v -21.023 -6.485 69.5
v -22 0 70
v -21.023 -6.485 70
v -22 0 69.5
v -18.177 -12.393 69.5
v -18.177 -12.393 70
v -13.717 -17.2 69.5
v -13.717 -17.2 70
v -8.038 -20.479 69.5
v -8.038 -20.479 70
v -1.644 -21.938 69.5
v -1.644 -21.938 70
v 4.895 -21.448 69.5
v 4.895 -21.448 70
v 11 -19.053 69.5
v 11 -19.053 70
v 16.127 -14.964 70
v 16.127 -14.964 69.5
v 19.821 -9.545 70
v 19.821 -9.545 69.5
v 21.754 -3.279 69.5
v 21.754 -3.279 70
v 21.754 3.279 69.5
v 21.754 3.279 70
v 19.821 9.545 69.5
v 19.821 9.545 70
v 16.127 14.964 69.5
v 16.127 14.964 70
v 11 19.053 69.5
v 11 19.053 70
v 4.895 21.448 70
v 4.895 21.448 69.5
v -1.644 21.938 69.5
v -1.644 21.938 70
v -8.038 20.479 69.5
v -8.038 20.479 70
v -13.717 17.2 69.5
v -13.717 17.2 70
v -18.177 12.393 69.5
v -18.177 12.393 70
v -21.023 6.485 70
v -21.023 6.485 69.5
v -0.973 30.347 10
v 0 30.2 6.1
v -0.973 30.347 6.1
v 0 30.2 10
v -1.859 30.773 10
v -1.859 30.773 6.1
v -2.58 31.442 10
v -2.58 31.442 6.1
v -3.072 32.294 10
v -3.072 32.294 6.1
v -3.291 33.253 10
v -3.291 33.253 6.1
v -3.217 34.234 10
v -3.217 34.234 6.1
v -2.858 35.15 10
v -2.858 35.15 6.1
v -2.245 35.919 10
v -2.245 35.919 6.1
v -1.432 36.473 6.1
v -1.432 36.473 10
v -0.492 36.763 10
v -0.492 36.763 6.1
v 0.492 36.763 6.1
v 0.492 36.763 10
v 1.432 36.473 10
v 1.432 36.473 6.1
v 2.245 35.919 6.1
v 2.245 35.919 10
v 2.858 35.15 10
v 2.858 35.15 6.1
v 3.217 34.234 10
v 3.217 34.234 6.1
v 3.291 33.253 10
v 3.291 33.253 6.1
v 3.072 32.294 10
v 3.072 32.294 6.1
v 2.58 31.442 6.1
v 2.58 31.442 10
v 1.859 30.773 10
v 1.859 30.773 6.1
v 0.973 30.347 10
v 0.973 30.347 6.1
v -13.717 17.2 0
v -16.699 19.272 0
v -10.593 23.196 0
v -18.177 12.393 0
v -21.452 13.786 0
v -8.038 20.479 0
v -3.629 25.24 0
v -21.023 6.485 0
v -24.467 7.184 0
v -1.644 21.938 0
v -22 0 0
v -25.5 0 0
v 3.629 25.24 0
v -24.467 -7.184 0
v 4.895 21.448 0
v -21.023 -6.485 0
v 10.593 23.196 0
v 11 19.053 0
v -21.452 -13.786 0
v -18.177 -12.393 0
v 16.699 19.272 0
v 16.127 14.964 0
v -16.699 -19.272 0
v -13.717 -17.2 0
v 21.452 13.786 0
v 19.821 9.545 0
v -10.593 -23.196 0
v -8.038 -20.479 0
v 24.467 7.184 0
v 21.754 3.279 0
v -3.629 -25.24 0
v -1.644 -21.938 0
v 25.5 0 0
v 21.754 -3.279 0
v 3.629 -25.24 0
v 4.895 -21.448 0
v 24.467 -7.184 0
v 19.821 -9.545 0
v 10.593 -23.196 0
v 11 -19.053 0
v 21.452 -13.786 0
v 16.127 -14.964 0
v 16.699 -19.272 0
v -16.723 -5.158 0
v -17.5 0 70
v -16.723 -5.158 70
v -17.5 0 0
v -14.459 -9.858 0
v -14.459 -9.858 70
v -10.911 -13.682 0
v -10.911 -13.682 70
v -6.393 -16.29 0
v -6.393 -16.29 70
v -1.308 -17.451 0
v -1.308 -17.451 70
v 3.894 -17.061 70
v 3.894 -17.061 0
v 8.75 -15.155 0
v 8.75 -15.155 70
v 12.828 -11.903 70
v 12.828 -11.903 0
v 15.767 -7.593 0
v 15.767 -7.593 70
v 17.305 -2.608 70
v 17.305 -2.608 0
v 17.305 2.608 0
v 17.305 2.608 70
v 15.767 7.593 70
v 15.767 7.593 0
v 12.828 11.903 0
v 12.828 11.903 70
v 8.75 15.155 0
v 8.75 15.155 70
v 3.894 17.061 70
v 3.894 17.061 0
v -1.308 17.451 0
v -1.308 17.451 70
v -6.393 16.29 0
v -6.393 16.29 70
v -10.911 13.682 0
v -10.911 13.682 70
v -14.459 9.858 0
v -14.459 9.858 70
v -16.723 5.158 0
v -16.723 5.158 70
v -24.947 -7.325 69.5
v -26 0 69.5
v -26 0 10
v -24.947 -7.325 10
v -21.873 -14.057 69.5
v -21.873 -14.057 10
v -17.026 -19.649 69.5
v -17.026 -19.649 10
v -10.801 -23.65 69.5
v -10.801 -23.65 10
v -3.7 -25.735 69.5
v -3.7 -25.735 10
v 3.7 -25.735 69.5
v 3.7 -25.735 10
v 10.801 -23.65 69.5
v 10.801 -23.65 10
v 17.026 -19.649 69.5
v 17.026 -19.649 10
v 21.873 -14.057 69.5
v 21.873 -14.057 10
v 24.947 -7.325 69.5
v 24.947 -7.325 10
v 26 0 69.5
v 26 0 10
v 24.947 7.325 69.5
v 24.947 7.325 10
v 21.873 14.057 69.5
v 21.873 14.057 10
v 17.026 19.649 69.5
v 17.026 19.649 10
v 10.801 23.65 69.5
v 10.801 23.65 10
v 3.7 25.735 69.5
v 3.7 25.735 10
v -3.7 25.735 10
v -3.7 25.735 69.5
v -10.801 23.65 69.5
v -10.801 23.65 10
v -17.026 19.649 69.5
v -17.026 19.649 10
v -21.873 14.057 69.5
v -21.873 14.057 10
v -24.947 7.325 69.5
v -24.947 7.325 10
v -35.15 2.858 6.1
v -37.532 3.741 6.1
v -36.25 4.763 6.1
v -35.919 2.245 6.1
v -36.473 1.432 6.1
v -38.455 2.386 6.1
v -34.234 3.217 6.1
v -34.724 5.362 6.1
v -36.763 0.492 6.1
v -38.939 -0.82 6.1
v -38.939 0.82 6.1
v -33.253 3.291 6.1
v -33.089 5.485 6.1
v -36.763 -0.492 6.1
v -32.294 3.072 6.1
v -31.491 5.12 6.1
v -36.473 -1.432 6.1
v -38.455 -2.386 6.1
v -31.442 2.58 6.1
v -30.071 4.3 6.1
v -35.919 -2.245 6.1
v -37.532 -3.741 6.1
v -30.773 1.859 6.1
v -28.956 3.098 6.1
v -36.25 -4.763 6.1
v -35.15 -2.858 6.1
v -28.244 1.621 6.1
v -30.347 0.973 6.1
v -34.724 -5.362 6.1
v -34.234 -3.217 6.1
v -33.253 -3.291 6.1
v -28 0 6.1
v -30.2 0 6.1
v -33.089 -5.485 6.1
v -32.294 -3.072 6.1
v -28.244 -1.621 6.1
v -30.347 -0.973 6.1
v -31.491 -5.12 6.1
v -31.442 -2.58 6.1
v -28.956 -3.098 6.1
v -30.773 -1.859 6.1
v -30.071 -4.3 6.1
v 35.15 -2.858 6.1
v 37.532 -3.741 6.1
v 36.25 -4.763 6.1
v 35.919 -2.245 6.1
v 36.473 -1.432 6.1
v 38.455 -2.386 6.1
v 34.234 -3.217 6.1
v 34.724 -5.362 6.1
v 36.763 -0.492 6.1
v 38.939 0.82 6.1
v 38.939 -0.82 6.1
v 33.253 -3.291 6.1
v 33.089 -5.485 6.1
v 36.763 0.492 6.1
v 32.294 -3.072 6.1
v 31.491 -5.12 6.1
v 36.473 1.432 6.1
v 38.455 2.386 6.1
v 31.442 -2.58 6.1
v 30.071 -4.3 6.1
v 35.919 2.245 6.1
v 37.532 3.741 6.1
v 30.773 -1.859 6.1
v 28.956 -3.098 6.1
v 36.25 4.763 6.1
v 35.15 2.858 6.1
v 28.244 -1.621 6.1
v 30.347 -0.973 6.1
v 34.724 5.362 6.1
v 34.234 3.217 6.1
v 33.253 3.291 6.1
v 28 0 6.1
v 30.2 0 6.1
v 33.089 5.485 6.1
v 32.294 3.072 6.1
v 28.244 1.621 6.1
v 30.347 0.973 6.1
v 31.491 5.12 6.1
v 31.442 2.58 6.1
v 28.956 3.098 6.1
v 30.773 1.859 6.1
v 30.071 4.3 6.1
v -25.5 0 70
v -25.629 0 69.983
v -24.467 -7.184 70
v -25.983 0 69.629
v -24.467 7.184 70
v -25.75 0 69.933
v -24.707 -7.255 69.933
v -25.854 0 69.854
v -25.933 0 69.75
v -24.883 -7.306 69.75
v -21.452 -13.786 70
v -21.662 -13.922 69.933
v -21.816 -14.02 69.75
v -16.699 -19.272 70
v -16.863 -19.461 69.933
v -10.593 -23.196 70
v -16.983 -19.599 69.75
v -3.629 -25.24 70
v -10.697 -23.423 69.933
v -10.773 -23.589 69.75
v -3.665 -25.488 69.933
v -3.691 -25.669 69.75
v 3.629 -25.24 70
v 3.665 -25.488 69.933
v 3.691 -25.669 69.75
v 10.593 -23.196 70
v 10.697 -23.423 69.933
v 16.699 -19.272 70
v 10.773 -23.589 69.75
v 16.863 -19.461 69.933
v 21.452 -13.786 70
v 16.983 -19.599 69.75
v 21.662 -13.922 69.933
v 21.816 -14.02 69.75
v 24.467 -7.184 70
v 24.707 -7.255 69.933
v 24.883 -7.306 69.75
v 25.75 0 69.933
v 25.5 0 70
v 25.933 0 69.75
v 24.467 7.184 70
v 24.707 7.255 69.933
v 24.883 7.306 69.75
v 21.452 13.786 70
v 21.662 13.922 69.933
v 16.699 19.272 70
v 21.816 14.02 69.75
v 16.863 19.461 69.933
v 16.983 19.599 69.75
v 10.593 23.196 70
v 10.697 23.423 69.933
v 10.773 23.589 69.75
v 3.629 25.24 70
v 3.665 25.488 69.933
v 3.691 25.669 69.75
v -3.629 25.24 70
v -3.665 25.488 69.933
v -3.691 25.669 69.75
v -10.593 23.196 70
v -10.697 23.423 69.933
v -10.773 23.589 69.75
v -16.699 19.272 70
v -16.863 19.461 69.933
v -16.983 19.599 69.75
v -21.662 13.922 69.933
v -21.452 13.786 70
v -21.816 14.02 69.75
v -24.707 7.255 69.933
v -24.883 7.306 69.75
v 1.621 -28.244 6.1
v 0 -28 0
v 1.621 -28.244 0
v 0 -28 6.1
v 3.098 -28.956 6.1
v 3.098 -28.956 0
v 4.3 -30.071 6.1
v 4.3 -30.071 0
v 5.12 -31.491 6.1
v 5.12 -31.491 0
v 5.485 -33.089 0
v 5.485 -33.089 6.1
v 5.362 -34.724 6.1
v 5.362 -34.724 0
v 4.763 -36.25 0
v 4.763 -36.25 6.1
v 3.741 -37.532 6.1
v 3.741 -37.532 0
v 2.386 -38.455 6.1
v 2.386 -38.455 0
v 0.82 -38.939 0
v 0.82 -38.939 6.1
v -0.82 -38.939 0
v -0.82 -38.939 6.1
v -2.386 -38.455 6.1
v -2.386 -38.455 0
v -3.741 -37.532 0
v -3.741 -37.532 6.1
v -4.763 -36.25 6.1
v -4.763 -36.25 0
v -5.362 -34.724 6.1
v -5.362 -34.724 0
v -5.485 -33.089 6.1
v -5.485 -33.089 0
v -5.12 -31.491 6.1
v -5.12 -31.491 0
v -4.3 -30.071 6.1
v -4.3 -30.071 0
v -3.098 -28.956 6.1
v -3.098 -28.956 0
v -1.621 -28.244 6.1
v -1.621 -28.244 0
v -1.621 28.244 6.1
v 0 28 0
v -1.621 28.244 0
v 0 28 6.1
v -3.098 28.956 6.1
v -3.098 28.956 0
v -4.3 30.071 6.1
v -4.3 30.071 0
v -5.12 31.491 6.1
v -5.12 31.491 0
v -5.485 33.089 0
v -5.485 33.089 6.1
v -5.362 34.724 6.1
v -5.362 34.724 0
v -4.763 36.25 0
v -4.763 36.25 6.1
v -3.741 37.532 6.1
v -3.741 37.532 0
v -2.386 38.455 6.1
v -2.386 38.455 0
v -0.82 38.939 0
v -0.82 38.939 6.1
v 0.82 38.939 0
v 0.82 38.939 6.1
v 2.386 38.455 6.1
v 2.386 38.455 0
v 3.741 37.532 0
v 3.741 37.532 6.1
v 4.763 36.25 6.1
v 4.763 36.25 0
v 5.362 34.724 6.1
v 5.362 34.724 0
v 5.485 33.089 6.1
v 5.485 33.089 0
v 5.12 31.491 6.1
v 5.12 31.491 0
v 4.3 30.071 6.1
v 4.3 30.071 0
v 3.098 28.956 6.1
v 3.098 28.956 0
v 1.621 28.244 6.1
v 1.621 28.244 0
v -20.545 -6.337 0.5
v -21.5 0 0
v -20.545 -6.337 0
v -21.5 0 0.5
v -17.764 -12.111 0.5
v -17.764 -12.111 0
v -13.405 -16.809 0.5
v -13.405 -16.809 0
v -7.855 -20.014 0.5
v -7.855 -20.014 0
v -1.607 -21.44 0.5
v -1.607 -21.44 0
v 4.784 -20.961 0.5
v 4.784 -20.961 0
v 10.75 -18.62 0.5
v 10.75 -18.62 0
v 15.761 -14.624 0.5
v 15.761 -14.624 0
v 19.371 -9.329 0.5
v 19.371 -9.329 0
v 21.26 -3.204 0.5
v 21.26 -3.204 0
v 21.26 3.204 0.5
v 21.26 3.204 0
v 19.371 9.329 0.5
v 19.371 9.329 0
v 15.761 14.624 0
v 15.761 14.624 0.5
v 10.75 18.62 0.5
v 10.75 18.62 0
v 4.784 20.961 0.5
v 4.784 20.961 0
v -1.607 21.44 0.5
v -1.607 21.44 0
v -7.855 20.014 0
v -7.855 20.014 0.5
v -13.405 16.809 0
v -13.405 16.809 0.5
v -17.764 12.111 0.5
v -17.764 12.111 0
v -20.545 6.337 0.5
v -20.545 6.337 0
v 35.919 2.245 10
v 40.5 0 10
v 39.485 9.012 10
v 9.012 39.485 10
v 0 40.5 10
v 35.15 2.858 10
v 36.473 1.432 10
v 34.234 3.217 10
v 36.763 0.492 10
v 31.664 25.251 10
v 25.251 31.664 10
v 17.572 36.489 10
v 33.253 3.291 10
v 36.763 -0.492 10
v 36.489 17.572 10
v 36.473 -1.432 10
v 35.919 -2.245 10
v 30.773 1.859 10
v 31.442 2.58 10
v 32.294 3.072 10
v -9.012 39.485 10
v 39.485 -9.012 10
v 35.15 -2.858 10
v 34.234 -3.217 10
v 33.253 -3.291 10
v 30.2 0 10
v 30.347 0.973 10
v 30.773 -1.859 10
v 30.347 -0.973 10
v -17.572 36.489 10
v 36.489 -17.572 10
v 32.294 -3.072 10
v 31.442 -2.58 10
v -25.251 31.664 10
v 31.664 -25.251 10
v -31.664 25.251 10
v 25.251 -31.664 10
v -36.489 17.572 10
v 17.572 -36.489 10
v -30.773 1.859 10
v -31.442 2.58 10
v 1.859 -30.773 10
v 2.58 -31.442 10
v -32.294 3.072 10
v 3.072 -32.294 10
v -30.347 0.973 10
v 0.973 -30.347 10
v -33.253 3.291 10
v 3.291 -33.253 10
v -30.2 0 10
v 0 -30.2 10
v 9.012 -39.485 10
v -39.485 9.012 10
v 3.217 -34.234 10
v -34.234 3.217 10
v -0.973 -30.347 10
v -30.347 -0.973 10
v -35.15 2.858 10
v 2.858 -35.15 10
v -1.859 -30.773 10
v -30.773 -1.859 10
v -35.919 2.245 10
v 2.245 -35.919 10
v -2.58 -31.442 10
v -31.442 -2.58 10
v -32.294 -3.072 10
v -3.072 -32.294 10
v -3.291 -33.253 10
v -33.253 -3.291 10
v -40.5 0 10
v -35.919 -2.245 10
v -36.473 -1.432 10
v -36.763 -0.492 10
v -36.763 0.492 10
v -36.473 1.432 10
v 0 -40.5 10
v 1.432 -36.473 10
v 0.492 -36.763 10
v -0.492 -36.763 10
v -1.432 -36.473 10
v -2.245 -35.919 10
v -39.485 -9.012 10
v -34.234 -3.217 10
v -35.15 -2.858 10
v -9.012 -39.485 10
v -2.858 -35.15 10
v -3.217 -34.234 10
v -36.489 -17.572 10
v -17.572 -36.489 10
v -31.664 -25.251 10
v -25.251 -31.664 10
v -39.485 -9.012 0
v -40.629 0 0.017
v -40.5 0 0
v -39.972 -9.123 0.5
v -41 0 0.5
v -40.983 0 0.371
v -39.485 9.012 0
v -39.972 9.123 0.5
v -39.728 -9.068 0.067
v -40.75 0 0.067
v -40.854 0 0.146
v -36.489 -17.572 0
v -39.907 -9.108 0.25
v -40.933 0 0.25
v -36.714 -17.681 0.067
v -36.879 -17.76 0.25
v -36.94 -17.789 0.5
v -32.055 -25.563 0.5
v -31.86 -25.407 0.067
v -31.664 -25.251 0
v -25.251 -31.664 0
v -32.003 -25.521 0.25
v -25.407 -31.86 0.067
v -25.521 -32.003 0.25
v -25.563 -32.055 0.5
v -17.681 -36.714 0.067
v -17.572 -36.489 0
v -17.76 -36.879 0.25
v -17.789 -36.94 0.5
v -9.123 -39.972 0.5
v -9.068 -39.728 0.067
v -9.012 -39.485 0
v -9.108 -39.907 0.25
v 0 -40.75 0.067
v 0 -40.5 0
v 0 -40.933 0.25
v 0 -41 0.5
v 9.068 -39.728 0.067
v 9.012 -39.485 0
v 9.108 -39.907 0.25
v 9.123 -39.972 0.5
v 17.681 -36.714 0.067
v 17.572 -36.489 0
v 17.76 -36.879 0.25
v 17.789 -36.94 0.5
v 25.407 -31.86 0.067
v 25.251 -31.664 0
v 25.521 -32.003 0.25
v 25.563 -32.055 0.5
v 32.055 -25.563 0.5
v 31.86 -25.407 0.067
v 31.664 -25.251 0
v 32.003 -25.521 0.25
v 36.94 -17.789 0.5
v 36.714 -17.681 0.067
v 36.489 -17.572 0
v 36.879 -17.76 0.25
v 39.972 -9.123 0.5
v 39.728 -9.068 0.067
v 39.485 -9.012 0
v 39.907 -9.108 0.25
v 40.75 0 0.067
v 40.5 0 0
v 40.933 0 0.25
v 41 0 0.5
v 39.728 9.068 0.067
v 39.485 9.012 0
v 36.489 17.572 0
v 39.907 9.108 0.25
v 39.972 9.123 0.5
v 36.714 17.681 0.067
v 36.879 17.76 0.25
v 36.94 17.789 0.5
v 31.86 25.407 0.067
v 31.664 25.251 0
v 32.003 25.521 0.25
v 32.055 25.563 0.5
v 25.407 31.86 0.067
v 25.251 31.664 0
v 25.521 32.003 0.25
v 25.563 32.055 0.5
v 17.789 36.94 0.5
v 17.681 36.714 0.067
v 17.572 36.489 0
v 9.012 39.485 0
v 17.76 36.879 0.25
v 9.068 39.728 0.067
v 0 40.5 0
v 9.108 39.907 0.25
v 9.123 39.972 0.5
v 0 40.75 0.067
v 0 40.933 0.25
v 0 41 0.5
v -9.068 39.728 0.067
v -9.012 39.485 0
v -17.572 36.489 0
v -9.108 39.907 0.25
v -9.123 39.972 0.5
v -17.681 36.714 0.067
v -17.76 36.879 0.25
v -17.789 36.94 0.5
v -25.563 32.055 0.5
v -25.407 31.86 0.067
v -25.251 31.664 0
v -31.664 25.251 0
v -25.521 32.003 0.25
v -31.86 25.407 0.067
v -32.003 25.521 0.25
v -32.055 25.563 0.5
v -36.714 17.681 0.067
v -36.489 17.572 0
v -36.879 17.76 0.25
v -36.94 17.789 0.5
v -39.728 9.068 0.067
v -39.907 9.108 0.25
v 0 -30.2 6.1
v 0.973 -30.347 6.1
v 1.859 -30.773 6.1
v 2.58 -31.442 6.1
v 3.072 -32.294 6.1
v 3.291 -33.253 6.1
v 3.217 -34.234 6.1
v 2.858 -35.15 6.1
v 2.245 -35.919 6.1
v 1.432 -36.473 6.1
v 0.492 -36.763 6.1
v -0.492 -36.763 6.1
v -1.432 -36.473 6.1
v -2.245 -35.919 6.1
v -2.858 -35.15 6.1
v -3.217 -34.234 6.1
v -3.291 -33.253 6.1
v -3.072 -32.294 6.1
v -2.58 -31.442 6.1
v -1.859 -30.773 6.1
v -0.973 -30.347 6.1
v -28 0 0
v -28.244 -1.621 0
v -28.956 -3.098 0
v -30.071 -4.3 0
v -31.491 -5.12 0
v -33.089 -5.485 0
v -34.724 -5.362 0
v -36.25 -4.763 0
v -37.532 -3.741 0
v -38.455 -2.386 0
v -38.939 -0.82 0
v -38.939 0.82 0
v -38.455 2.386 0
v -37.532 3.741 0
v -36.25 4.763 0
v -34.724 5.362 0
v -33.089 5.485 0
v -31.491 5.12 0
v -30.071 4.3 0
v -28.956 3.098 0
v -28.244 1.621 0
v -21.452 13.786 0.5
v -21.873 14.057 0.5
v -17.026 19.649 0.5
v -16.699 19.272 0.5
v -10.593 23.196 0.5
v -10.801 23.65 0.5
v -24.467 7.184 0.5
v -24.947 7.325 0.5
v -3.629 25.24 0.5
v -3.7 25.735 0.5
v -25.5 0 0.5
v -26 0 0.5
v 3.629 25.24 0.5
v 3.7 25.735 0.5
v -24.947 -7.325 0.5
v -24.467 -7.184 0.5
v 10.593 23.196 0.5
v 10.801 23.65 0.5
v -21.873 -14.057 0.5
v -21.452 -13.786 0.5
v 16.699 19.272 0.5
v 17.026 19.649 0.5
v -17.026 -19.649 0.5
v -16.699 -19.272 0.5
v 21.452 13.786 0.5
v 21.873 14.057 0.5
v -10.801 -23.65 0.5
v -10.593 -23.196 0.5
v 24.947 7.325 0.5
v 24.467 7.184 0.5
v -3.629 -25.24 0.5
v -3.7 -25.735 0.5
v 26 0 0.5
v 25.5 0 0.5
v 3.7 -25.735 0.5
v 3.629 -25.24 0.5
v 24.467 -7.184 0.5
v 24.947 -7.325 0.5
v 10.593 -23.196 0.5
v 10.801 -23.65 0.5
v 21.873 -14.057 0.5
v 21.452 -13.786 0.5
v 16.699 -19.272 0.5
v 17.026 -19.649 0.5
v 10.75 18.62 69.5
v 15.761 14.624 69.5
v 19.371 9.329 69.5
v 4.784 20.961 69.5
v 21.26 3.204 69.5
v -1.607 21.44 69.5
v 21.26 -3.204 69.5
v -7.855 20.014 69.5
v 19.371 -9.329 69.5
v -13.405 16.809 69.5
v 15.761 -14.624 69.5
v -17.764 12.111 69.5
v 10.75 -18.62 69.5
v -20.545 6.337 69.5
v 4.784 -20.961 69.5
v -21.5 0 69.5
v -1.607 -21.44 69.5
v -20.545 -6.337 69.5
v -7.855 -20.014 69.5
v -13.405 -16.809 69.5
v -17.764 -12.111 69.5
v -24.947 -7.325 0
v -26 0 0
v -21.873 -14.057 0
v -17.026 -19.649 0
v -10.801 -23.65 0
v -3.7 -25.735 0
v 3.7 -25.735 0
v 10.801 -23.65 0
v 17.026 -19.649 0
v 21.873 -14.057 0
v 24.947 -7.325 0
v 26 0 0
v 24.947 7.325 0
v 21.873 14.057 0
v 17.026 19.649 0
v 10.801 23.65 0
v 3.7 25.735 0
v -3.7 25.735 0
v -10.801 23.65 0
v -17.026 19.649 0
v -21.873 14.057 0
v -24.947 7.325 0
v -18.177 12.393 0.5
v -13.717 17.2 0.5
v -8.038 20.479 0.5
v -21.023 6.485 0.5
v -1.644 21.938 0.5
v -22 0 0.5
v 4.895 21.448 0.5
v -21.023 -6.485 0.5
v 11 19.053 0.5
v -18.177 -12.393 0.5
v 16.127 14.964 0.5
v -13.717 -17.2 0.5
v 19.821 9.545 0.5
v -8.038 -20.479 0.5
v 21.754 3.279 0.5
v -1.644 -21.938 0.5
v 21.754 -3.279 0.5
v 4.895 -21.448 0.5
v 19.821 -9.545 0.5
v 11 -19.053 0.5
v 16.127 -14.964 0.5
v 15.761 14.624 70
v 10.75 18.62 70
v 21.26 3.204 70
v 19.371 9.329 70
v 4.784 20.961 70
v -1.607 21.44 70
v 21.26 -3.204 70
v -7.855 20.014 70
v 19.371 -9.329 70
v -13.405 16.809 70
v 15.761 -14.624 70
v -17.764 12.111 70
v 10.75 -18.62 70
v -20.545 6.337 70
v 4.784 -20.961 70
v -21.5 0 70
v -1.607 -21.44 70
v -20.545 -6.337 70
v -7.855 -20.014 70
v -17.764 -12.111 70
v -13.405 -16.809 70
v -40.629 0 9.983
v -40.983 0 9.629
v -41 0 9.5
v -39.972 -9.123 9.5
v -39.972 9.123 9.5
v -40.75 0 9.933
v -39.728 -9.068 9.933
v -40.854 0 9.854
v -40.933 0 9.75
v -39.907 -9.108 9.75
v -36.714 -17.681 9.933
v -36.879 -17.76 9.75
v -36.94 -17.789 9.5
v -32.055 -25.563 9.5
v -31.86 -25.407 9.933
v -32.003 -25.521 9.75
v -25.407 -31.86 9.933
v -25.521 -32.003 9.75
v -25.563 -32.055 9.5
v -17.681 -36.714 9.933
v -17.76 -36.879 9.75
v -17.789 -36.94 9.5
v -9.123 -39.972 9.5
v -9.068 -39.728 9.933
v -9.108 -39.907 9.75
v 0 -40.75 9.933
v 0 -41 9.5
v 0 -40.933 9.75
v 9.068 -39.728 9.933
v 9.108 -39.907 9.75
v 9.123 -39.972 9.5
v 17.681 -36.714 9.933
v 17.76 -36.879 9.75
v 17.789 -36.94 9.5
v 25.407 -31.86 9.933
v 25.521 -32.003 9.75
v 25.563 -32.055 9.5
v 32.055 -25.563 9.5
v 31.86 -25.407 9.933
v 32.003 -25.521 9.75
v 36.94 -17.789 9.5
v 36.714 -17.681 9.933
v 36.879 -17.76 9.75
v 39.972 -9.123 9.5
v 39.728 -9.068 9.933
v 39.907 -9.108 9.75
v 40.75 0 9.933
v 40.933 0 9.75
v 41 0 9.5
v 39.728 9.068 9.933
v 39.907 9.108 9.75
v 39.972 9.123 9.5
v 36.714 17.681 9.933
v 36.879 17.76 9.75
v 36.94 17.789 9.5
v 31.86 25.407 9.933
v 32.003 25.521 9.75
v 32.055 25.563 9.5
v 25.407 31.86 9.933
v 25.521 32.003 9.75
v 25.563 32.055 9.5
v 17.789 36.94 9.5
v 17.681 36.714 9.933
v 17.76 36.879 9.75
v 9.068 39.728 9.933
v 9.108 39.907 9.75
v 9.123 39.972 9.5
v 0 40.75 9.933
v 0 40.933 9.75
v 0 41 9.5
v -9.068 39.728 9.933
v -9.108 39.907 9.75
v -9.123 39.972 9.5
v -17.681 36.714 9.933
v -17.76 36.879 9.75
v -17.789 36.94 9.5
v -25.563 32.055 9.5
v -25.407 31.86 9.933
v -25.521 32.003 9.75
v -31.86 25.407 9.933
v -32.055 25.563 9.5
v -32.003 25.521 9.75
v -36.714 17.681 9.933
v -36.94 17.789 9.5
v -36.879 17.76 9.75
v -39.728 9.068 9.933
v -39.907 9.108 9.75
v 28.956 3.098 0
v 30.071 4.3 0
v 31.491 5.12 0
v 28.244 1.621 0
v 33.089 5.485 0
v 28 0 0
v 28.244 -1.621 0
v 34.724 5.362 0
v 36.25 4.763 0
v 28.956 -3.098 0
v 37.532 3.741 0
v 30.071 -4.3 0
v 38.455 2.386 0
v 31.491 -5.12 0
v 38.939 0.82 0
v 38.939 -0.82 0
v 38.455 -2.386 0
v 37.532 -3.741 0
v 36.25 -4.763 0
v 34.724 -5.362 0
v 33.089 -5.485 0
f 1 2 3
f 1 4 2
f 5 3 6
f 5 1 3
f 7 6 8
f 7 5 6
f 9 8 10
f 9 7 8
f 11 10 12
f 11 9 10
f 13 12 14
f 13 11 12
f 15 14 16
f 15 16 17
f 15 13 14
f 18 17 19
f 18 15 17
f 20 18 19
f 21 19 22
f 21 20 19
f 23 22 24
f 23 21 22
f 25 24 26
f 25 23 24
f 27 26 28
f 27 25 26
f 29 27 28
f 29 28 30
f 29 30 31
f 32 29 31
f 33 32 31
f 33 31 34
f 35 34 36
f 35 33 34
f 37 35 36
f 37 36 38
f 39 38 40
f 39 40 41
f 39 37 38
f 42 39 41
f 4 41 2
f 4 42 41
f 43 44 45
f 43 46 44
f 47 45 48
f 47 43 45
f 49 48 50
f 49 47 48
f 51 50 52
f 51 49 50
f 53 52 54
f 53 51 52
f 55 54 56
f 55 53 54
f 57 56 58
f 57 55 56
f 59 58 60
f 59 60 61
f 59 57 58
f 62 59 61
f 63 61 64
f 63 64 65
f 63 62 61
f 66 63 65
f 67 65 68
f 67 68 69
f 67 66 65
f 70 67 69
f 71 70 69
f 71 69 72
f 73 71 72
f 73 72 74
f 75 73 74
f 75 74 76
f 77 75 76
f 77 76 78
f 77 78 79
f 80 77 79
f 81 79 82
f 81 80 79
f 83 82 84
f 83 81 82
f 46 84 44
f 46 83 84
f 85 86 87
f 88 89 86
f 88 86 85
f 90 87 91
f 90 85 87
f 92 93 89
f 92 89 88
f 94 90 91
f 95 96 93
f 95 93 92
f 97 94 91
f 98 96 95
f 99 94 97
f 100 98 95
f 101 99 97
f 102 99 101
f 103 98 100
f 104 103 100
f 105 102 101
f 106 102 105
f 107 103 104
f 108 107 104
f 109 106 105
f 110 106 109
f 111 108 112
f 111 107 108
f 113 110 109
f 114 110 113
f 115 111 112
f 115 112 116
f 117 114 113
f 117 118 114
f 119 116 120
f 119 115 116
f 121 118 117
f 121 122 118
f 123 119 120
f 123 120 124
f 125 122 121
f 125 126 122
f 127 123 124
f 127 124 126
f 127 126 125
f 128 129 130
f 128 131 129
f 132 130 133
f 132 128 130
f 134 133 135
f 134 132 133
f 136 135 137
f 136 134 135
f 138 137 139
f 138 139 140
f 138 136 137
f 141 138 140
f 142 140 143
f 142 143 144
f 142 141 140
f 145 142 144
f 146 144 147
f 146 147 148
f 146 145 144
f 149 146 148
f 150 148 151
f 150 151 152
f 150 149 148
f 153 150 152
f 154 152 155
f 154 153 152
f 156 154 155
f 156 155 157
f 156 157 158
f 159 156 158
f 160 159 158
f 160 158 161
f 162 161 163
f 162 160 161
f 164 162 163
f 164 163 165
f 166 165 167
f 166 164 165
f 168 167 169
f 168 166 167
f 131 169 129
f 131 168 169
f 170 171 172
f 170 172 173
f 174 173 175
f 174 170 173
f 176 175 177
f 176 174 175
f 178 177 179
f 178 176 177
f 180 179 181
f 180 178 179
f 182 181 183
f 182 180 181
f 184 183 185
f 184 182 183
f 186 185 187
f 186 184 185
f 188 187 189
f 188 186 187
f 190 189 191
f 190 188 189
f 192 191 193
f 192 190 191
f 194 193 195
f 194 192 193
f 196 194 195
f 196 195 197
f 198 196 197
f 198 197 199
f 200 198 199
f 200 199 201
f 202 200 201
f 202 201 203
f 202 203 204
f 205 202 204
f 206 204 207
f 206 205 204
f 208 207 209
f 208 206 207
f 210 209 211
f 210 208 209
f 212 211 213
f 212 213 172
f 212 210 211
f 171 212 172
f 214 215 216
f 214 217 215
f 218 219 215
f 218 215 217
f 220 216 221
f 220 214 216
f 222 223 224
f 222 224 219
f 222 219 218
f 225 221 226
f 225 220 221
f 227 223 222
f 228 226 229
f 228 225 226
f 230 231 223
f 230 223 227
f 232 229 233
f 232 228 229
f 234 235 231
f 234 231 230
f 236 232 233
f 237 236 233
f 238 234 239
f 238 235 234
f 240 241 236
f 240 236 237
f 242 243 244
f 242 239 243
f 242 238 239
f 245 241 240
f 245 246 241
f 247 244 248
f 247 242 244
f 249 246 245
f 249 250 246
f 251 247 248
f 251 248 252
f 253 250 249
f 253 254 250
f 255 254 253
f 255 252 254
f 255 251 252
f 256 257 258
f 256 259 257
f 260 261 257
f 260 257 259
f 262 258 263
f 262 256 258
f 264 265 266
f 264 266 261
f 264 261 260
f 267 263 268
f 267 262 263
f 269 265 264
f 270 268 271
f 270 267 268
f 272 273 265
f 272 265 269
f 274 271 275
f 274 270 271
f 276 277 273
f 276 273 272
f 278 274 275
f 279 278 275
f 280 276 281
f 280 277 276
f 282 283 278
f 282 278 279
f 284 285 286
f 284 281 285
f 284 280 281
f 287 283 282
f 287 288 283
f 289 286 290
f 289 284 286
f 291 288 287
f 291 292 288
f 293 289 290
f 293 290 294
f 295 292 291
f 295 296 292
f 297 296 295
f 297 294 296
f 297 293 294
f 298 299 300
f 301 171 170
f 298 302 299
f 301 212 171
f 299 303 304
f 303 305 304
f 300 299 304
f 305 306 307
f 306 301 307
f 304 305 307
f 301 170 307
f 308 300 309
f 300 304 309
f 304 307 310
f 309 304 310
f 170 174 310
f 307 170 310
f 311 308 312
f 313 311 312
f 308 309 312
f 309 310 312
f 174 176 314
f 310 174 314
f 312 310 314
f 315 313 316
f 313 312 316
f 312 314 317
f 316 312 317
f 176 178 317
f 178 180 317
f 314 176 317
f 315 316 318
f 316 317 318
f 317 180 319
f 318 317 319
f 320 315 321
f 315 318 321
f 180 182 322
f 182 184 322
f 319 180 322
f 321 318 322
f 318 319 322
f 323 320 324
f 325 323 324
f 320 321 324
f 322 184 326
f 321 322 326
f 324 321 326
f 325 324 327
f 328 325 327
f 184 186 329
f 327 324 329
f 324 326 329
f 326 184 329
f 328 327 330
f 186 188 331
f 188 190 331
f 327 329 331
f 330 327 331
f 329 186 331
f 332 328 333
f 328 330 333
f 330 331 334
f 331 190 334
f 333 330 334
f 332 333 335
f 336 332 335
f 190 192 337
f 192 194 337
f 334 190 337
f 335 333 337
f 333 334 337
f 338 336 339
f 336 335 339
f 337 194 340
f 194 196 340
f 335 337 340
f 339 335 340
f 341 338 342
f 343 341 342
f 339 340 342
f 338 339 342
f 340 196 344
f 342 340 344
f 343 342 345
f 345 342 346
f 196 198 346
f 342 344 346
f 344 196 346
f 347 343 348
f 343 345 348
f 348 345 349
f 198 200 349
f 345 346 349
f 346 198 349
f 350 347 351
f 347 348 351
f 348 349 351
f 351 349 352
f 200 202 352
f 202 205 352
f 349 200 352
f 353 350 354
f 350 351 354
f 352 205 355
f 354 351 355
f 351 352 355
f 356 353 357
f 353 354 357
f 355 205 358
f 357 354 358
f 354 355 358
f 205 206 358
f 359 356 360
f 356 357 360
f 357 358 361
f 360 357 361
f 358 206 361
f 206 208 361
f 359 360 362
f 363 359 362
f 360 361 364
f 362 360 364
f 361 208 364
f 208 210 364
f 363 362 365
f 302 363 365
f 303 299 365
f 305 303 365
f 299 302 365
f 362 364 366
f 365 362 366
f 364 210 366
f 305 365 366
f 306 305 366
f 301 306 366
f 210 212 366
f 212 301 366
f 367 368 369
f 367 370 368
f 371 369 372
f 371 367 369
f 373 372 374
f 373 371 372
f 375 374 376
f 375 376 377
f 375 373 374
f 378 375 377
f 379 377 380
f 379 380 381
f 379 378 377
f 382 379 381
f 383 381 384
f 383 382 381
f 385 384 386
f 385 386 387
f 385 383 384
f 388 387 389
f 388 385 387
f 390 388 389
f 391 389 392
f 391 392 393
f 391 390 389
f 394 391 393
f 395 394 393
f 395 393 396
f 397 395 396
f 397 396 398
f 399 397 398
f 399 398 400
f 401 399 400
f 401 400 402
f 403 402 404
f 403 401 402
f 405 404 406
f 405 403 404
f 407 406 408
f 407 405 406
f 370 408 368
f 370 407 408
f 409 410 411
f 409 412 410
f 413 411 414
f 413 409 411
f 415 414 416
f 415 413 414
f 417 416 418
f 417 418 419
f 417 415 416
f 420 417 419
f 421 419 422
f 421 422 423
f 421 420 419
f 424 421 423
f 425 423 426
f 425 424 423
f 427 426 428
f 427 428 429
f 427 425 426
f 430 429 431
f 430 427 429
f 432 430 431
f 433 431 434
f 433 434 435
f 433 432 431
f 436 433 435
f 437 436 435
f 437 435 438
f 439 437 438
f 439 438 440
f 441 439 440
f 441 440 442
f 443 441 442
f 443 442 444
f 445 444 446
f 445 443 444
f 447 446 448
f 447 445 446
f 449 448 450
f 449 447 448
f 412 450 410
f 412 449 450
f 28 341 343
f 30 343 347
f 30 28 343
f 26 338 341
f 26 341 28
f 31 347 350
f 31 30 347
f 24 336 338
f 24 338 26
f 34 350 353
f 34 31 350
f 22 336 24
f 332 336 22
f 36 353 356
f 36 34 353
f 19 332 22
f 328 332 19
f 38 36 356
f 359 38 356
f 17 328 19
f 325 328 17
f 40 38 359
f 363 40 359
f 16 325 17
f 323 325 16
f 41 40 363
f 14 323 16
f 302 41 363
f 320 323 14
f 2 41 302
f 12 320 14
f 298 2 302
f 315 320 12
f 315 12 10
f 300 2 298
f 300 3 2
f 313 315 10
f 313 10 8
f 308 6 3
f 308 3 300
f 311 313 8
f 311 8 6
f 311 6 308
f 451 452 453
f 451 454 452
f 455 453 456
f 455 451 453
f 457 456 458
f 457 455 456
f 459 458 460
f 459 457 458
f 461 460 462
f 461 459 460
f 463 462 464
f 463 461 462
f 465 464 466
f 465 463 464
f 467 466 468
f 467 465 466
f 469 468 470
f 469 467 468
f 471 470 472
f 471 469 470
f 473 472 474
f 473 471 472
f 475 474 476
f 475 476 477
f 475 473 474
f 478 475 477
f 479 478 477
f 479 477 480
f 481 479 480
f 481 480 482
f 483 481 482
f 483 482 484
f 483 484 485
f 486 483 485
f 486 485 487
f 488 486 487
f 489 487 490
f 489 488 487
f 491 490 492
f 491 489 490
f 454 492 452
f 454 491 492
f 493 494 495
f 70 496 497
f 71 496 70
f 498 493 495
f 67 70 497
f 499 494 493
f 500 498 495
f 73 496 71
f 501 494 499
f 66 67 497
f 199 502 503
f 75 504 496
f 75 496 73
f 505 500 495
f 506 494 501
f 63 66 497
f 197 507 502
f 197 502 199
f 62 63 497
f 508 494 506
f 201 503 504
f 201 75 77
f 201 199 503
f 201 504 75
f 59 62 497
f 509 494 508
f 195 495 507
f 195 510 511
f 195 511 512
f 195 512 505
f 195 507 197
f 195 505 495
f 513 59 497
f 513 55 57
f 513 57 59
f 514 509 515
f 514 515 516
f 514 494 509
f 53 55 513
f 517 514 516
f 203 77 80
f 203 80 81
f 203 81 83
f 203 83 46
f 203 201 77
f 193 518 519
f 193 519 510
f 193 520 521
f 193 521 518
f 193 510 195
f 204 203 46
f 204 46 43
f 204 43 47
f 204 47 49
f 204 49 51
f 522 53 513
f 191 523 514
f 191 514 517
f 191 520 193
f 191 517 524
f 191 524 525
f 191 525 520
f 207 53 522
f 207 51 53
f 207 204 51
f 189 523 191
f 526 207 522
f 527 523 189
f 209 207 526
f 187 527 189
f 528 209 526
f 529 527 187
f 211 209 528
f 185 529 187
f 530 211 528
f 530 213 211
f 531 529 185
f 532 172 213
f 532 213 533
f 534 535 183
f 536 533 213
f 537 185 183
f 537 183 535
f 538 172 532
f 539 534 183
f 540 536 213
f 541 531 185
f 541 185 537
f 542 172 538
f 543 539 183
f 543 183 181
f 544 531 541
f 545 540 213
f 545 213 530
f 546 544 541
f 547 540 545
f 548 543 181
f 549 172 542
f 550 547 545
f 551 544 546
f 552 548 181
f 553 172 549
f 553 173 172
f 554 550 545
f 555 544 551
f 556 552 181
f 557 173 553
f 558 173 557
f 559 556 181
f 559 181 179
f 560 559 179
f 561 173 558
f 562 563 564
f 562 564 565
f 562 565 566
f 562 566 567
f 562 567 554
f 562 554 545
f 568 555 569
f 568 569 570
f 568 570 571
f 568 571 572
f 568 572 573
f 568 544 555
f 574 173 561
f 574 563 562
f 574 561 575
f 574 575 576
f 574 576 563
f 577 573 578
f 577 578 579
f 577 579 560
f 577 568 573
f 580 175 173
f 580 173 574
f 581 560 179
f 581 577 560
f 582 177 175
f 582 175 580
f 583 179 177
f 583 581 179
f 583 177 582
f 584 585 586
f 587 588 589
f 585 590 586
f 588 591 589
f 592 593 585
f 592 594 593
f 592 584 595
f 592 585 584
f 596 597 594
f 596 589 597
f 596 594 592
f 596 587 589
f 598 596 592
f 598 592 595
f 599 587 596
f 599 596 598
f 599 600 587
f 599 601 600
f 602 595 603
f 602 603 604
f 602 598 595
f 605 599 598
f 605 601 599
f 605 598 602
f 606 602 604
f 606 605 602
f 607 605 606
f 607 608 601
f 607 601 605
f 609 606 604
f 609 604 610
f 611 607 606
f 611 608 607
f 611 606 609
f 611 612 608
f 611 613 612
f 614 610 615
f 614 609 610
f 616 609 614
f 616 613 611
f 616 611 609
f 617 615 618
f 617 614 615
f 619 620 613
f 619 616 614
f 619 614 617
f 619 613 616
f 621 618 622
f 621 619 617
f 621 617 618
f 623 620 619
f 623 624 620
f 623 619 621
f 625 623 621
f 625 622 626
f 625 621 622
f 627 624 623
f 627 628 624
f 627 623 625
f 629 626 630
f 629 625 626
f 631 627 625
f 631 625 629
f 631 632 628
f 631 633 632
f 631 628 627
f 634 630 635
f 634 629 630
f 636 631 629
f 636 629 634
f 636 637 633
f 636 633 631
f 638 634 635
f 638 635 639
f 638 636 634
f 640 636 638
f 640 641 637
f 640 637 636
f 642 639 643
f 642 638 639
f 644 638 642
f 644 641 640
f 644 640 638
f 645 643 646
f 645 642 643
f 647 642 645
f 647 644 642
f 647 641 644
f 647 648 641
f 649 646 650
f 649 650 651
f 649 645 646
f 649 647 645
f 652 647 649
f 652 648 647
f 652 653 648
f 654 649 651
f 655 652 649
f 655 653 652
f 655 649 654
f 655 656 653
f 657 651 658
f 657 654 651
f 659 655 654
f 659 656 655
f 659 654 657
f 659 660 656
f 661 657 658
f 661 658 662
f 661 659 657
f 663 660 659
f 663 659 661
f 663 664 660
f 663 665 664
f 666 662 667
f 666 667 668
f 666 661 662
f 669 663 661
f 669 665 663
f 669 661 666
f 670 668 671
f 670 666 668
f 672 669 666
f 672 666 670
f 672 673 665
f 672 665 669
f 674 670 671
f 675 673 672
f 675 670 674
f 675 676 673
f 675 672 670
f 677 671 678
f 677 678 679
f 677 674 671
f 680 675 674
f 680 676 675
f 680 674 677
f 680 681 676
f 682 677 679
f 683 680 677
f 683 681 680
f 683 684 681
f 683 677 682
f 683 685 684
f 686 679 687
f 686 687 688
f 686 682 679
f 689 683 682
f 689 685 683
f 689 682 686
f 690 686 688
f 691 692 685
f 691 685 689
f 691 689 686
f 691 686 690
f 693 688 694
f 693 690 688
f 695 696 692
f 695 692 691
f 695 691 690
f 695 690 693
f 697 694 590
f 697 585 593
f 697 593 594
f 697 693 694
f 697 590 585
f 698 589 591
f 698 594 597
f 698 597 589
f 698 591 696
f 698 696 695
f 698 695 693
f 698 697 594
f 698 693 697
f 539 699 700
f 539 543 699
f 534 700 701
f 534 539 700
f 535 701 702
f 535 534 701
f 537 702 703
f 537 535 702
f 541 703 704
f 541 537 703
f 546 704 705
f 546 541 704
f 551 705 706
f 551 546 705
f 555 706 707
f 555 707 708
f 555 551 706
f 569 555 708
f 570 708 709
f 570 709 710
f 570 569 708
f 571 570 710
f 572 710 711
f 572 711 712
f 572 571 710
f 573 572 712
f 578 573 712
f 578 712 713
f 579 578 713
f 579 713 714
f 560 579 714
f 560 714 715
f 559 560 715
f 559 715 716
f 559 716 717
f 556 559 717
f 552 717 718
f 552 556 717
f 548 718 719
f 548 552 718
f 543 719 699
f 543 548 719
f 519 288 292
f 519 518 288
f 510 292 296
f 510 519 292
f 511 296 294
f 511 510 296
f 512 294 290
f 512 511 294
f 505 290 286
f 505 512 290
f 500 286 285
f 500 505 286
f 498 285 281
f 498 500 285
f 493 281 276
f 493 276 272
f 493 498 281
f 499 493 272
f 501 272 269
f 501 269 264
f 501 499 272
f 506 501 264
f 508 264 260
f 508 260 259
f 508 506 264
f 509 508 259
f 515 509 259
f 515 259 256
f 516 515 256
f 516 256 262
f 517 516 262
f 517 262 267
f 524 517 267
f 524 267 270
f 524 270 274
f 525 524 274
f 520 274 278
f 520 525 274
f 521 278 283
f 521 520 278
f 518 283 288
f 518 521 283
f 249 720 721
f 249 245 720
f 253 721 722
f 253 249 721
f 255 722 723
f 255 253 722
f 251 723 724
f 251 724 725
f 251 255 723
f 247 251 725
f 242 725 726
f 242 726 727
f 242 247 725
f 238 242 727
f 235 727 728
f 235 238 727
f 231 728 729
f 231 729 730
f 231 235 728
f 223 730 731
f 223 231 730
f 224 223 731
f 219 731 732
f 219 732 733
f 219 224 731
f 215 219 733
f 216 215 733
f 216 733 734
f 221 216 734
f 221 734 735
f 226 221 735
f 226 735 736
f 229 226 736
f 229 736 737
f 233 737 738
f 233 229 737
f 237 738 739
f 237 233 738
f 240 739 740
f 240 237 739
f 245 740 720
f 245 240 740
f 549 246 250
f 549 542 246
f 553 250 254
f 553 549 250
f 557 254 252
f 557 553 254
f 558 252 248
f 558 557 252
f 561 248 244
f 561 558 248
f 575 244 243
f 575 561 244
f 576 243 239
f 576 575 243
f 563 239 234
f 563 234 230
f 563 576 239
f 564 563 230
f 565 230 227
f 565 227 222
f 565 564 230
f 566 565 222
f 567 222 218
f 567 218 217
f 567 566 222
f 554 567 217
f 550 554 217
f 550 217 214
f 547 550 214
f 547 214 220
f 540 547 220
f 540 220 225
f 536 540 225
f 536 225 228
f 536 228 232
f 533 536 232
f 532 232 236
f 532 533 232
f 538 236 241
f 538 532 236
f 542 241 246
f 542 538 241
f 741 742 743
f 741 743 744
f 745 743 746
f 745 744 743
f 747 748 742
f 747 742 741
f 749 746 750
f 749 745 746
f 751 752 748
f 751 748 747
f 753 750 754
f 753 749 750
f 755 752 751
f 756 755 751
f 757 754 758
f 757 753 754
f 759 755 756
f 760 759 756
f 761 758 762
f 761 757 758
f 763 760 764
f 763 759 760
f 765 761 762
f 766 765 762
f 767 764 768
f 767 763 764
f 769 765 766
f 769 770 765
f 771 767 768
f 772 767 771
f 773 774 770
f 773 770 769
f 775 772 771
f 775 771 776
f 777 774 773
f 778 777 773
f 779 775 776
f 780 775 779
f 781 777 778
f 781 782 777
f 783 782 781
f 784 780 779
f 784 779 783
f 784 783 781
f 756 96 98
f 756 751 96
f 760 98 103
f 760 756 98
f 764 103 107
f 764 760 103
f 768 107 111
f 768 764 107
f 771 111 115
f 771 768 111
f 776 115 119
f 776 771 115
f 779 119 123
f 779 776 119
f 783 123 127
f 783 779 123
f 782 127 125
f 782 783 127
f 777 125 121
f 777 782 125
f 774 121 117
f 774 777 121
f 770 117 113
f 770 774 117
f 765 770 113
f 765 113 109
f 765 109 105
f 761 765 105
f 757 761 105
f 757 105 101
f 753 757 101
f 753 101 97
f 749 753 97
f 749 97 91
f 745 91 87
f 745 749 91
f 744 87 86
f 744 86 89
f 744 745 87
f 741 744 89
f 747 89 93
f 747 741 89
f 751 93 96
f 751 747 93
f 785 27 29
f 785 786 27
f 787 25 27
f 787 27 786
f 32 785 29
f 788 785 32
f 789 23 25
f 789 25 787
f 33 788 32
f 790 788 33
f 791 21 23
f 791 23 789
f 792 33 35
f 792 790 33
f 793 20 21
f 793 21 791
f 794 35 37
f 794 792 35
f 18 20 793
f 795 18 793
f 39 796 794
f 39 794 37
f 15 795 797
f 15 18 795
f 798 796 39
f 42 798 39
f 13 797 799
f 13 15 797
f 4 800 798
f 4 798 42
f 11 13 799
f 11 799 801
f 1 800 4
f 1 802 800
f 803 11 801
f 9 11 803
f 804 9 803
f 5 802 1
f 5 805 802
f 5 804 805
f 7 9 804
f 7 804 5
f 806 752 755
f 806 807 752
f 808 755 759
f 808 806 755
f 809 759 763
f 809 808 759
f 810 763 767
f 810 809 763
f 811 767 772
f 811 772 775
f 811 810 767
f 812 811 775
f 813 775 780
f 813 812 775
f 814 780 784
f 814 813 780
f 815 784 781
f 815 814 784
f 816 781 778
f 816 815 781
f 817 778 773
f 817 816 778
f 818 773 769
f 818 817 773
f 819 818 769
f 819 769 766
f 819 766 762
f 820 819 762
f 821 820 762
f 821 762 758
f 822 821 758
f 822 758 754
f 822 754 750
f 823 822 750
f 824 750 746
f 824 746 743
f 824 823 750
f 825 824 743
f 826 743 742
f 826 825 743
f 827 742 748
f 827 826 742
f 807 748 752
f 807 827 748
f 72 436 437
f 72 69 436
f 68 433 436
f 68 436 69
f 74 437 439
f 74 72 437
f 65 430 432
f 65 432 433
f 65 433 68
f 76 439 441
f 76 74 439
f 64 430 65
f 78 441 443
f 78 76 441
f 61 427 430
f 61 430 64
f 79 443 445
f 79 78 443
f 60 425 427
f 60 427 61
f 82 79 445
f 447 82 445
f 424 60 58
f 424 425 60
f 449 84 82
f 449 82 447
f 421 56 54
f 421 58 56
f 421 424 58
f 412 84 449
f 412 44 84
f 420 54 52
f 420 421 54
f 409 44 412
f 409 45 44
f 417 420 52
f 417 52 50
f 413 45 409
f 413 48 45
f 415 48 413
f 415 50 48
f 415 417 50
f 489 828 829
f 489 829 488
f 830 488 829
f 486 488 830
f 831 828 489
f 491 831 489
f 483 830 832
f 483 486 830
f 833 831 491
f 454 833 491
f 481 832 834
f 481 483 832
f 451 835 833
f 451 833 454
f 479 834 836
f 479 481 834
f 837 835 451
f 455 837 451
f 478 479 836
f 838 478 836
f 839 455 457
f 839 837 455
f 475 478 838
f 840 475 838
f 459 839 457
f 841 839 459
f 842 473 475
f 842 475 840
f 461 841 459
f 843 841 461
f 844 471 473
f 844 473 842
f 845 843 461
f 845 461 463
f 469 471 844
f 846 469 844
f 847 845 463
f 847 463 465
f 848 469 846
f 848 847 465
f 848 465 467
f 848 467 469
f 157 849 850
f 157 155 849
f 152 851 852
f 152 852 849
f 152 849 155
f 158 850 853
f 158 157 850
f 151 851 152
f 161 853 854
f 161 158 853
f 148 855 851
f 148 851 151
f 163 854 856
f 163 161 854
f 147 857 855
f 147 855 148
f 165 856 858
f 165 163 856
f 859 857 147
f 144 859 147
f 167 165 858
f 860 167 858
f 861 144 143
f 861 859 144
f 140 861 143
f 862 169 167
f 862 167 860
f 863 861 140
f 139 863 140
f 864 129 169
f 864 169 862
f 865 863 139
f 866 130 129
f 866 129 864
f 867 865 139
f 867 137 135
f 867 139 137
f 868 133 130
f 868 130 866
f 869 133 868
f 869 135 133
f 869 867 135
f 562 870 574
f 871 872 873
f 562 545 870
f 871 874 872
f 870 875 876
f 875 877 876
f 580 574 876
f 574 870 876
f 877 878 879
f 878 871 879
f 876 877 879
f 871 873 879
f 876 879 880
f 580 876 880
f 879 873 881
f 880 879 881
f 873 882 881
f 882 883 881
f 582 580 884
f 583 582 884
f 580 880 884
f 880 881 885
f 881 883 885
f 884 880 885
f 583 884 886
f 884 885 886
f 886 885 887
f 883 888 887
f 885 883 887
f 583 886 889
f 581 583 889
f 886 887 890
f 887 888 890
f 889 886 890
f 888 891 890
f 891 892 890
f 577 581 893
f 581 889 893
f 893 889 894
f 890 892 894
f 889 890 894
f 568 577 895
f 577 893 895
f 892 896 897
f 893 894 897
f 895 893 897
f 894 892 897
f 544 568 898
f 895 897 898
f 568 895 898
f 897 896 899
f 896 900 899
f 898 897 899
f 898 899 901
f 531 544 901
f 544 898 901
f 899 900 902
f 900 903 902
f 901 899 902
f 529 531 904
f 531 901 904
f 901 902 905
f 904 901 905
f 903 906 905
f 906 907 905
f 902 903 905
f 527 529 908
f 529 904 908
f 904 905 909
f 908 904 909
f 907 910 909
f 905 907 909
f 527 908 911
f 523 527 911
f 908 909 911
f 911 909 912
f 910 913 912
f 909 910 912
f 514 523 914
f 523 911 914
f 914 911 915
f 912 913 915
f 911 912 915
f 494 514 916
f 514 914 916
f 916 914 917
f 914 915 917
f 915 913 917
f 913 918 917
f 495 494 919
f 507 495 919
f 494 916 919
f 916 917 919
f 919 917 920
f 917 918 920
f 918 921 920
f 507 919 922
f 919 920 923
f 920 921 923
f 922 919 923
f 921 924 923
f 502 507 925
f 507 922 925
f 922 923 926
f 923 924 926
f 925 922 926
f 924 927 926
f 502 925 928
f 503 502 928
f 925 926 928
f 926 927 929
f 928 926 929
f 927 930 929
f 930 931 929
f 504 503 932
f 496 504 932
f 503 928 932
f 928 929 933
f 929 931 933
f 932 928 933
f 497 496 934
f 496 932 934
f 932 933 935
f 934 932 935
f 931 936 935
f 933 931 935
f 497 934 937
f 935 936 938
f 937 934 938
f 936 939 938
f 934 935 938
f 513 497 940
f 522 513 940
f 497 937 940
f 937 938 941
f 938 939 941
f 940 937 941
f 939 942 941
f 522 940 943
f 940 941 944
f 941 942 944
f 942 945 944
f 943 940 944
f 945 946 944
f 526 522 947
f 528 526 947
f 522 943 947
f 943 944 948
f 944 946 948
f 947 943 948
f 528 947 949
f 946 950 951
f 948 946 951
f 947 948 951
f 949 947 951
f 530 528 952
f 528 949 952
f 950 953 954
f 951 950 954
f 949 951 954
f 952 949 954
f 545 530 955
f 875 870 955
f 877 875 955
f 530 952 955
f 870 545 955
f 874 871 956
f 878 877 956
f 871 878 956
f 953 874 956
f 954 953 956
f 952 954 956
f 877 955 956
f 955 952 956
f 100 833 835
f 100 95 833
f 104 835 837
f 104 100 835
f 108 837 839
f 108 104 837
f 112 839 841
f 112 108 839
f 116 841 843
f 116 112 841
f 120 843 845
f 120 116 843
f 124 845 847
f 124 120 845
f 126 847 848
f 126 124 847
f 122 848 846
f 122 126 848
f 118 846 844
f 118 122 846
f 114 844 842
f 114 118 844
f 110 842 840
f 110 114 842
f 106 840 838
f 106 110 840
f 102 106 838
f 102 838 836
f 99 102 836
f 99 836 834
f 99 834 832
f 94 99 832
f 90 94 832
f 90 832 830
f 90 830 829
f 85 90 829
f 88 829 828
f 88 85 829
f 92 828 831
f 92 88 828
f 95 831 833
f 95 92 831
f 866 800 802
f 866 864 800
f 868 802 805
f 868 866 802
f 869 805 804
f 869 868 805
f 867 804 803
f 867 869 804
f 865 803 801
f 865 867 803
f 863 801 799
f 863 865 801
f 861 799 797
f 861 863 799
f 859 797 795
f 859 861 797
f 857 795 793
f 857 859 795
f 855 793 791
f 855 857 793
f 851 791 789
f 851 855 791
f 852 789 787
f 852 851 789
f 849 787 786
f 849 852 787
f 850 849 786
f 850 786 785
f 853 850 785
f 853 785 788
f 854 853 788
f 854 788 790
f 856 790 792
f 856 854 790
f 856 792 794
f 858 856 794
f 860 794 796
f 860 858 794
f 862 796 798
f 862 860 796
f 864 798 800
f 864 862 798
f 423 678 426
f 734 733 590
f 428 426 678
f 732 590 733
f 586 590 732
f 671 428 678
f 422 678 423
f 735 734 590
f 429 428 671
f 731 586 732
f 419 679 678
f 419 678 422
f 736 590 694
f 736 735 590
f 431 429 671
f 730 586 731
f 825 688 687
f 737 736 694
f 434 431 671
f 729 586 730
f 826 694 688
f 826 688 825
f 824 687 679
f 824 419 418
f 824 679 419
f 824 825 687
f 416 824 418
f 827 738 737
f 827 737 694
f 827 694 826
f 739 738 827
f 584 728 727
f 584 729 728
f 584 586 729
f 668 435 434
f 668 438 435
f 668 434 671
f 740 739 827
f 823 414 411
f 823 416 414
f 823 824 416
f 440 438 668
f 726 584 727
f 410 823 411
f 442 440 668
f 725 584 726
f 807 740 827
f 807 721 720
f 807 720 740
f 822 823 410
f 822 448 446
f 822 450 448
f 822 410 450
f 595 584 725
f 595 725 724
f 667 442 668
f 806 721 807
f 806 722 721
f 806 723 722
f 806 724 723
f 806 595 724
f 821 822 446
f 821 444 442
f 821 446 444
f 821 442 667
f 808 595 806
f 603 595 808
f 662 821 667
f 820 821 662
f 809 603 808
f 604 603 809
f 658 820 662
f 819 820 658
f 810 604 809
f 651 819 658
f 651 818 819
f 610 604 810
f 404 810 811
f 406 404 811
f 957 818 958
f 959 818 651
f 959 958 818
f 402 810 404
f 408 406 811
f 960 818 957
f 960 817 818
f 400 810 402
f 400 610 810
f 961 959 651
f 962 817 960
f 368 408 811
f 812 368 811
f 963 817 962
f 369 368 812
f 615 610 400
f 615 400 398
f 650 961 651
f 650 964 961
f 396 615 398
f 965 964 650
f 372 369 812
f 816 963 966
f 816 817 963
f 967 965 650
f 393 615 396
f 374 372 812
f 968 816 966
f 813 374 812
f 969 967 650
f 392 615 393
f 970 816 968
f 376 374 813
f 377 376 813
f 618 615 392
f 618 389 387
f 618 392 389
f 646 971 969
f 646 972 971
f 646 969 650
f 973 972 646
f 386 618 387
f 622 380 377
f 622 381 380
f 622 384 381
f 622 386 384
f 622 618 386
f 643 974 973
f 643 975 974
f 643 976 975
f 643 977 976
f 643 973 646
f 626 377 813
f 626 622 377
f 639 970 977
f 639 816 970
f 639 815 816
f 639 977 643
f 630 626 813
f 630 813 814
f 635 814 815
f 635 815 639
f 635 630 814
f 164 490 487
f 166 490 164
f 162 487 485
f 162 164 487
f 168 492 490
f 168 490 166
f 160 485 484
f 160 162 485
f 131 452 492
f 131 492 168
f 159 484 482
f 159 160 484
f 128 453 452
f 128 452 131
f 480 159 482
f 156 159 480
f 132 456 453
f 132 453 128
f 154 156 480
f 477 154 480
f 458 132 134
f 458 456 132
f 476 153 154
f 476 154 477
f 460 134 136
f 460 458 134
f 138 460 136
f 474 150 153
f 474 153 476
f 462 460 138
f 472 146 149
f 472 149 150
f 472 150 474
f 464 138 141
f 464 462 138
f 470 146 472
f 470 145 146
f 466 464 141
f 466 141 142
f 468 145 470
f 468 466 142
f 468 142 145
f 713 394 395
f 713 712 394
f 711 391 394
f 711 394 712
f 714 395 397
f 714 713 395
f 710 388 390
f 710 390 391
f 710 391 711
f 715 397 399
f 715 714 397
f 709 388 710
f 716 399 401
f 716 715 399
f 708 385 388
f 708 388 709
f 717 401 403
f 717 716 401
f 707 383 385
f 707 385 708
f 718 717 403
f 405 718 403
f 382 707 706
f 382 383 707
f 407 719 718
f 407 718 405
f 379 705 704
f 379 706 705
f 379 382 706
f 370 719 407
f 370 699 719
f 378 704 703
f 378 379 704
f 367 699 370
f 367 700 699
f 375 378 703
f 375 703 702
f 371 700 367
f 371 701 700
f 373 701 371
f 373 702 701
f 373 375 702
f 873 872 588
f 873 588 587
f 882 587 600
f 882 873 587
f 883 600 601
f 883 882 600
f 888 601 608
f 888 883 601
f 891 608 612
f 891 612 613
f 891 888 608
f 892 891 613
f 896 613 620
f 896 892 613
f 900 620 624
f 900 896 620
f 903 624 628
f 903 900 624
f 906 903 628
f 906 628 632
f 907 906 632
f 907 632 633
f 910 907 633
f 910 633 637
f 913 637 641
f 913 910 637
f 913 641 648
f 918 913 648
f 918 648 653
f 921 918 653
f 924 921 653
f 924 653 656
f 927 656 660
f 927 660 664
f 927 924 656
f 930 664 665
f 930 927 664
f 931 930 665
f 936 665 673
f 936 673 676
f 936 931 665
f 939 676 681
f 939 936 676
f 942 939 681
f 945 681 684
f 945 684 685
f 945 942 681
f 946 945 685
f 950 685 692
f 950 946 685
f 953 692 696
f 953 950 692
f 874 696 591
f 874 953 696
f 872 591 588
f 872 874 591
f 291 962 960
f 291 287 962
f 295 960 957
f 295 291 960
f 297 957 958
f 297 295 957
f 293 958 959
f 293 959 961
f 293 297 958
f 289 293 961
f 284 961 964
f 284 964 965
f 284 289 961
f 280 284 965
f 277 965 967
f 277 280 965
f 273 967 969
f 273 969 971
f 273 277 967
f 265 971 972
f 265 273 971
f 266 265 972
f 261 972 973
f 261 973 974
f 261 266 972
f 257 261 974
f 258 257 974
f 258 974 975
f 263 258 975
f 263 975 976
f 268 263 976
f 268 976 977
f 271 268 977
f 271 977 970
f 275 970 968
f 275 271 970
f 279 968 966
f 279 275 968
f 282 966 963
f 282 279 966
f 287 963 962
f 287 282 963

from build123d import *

# Parameters (mm, degrees)
PADR_OCIRCULAR1_COUNT = 4
FILETE1_R             = 0.5


with BuildPart() as part:
    # Esboço1 → Revolução1 (revolve)
    with BuildSketch(Plane(origin=(0, 0, 0), x_dir=(0, 0, -1), z_dir=(1, 0, 0)), mode=Mode.PRIVATE) as revolu_o1_sk:
        Polygon((0, 17.5), (0, 21.5), (-0.5, 21.5), (-0.5, 22), (0, 22), (0, 25.5), (-0.5, 25.5), (-0.5, 26), (0, 26), (0, 41), (-10, 41), (-10, 26), (-70, 26), (-70, 22), (-69.5, 22), (-69.5, 21.5), (-70, 21.5), (-70, 17.5), align=None)
    revolve(revolu_o1_sk.sketch.rotate(Axis((0, 0, 0), (0, 0, 1)), 90), axis=Axis((0, 0, 0), (0, 0, 1)))  # turned: the seam where the file's is

    # Esboço5 → Corte-Revolução1 (revolve, cut)
    with BuildSketch(Plane(origin=(0, 0, 0), x_dir=(0, 0, -1), z_dir=(1, 0, 0)), mode=Mode.PRIVATE) as corte_revolu_o1_sk:
        Polygon((0, 39), (-6.1, 39), (-6.1, 36.8), (-10, 36.8), (-10, 33.5), (0, 33.5), align=None)
    corte_revolu_o1 = revolve(corte_revolu_o1_sk.sketch.rotate(Axis((0, 33.5, 0), (0, 0, -1)), 180), axis=Axis((0, 33.5, 0), (0, 0, -1)), mode=Mode.SUBTRACT)  # turned: the seam where the file's is

    # PadrãoCircular1: Corte-Revolução1 ×4 about axis
    padr_ocircular1_axis = Axis((0, 0, 0), (0, 0, 1))
    for i in range(1, PADR_OCIRCULAR1_COUNT):
        add(corte_revolu_o1.rotate(padr_ocircular1_axis, i * 360 / PADR_OCIRCULAR1_COUNT), mode=Mode.SUBTRACT)

    # Filete1
    filete1_edges = [part.edges().sort_by_distance(p)[0] for p in [
        (26, 0, 70),
        (41, 0, 10),
        (41, 0, 0),
    ]]
    fillet(filete1_edges, radius=FILETE1_R)


solid = part.part
